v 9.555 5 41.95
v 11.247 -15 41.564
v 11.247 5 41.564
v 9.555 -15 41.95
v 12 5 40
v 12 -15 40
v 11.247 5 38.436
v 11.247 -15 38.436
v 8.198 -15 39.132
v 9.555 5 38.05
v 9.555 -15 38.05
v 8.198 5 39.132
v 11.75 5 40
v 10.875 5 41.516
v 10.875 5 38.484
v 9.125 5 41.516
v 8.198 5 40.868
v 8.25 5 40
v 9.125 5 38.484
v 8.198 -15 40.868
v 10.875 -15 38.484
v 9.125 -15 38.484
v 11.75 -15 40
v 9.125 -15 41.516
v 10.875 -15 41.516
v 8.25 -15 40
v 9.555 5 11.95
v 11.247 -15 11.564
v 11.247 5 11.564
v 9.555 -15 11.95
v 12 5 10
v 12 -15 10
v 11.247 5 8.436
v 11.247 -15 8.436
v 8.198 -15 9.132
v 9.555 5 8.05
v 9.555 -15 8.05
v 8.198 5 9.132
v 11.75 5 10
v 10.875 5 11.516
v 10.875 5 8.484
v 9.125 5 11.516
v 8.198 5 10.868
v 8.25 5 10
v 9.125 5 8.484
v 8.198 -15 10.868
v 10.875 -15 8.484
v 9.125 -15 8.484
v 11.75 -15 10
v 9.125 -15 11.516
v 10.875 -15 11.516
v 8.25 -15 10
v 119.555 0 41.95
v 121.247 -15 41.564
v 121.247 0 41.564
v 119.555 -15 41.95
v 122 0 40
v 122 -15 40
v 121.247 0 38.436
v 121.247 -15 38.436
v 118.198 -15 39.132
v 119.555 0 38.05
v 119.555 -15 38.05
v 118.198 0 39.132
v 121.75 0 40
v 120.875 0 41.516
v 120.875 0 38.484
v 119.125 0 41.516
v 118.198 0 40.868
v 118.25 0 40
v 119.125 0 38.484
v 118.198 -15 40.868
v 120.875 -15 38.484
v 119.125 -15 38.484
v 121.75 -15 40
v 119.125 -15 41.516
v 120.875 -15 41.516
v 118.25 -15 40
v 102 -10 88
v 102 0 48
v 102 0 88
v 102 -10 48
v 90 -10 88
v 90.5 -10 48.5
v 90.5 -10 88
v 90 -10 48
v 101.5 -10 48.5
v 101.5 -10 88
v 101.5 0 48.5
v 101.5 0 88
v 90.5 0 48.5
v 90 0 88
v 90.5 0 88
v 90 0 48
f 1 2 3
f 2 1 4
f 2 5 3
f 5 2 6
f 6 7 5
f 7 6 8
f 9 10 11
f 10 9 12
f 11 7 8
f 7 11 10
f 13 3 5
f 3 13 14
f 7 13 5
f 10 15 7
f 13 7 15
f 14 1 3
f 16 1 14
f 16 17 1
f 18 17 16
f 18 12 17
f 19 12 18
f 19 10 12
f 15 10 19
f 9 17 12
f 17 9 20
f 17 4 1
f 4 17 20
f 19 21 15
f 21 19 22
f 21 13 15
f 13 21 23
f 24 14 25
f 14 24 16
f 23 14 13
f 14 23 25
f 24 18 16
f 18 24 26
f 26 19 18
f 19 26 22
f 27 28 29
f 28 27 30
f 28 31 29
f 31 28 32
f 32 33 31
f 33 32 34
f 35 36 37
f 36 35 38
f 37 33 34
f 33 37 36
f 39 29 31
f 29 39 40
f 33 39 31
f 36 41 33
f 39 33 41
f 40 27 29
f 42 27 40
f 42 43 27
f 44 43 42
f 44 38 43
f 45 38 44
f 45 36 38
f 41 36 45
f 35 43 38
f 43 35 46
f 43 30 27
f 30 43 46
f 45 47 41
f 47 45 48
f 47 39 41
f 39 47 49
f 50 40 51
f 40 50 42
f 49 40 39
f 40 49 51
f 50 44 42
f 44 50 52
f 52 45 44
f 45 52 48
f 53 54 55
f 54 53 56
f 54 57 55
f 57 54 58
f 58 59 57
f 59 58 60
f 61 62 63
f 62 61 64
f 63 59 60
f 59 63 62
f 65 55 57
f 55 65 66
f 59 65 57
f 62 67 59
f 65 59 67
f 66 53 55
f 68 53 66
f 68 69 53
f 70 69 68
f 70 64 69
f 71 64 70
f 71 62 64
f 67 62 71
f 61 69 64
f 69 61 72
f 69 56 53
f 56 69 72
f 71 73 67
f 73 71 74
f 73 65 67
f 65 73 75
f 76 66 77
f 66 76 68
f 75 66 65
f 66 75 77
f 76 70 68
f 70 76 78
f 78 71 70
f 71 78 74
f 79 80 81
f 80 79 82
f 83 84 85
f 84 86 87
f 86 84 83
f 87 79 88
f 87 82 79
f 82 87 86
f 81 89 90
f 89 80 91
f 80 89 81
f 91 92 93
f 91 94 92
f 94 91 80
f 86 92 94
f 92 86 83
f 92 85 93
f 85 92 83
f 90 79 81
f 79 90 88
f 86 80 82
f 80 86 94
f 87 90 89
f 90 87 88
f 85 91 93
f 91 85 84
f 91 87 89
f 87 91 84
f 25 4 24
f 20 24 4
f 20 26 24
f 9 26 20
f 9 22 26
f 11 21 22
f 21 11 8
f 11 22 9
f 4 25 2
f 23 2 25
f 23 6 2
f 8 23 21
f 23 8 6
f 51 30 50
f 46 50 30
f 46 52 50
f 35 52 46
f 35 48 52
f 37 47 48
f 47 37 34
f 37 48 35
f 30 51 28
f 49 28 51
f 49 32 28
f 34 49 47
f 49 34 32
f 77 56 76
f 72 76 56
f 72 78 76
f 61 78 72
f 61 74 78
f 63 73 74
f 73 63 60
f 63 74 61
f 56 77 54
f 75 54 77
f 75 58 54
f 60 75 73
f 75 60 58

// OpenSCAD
module outline(r) {
  difference() {
    minkowski() {
      children();
      circle(r=1.2);
    }
    children();
  }

  difference() {
  minkowski() {
    children();
    circle(r=-5);
    }
    children();
    }
}

cookie_thickness = 10;

rotate([90,0,0]) {
  translate([0,0,-5]) {
    linear_extrude(height=cookie_thickness) outline()  import("dragon_tail.dxf");
    translate([10,40,0]) difference() { cylinder(d=4, h=cookie_thickness); cylinder(d=3.5, h=cookie_thickness); };
    translate([10,10,0]) difference() { cylinder(d=4, h=cookie_thickness); cylinder(d=3.5, h=cookie_thickness); };
    }
   // }
translate([0,0,0]) {
    linear_extrude(height=cookie_thickness) outline() import("dragon_body.dxf");
    translate([10,40,0]) difference() { cylinder(d=4, h=cookie_thickness); cylinder(d=3.5, h=cookie_thickness); };
    translate([10,10,0]) difference() { cylinder(d=4, h=cookie_thickness); cylinder(d=3.5, h=cookie_thickness); };
    translate([120,40,0]) difference() { cylinder(d=4, h=cookie_thickness); cylinder(d=3.5, h=cookie_thickness); };
    translate([90,48,0]) difference() { cube(size=[cookie_thickness+2,40,cookie_thickness]);
                                        translate([0.5,0.5,0]) cube(size=[cookie_thickness+1,40,cookie_thickness]);};
    }
color("green") translate([-20,0,5]) {
    linear_extrude(height=cookie_thickness) outline() import("dragon_back_leg.dxf");
    translate([30,40,0]) difference() { cylinder(d=4, h=cookie_thickness); cylinder(d=3.5, h=cookie_thickness); };
    translate([30,10,0]) difference() { cylinder(d=4, h=cookie_thickness); cylinder(d=3.5, h=cookie_thickness); };
    }

color("green") translate([90,0,5]) {
    linear_extrude(height=cookie_thickness) outline() import("dragon_front_leg.dxf");
    translate([30,40,0]) difference() { cylinder(d=4, h=cookie_thickness); cylinder(d=3.5, h=cookie_thickness); };
    }

color("green") translate([90,0,5]) rotate([0,90,0]) linear_extrude(height=cookie_thickness) outline() import("dragon_wings.dxf");
}
